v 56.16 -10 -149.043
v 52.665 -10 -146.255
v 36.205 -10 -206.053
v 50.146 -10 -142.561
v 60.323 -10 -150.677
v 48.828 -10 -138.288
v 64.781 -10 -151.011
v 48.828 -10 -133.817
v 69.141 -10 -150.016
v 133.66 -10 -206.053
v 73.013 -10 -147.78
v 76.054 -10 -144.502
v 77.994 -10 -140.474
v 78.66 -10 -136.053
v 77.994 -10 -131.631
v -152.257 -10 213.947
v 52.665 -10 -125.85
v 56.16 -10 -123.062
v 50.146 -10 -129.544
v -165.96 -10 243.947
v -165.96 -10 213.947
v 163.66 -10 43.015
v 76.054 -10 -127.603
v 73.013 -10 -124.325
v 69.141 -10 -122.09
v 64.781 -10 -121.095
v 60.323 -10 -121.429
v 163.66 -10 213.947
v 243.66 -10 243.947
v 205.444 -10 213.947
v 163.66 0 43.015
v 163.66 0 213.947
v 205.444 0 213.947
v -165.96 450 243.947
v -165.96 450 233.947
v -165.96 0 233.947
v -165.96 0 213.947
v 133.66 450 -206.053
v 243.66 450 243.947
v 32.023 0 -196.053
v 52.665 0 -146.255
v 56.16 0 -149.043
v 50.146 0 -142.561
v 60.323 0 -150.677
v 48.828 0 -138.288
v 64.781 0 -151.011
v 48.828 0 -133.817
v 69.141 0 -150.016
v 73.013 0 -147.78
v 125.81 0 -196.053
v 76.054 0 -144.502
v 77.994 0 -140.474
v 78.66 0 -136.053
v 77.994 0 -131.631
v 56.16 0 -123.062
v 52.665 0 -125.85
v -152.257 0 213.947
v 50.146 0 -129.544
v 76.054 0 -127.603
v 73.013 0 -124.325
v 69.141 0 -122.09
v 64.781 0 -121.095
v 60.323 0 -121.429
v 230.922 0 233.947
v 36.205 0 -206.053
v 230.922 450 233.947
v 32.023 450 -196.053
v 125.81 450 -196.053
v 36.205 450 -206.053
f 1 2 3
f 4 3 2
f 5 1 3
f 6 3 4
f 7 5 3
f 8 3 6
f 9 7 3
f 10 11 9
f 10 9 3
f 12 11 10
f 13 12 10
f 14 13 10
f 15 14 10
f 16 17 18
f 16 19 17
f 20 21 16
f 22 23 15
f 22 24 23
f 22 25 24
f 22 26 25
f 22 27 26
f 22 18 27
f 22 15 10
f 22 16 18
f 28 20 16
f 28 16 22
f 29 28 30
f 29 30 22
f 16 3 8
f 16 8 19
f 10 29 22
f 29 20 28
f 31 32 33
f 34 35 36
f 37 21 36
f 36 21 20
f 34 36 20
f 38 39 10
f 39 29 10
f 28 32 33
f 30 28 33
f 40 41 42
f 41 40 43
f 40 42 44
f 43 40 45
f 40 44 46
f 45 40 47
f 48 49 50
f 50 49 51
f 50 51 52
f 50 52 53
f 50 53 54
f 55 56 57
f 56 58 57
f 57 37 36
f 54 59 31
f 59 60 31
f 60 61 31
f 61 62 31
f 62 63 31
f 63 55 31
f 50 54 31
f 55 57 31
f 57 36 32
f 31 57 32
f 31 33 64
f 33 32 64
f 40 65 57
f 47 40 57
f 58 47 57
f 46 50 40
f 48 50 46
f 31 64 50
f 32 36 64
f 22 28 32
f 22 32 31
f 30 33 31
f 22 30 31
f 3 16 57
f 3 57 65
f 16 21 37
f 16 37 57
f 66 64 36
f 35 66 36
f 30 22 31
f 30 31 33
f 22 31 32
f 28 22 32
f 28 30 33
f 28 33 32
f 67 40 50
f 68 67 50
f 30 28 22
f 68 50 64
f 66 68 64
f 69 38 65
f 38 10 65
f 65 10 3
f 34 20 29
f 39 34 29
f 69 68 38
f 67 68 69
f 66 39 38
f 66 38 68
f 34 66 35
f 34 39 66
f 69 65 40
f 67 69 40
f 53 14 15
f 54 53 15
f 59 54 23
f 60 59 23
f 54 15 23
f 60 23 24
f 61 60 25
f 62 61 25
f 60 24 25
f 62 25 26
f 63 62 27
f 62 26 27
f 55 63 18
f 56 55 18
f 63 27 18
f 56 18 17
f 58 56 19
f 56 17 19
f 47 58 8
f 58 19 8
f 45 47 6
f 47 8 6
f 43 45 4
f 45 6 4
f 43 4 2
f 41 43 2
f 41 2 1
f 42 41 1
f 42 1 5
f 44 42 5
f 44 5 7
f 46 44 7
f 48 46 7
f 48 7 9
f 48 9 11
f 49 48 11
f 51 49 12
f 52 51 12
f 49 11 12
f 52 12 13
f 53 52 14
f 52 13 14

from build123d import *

# Parameters (mm, degrees)
F0_W      = 540
F0_H      = 390
F1_DEPTH  = 10
F2_W      = 80
F2_H      = 80
F2_R      = 15
F3_DEPTH  = 10
F4_R      = 15
F5_DEPTH  = 25
F7_DEPTH  = 25
F8_W      = 80
F8_H      = 80
F8_R      = 15
F9_DEPTH  = 25
F11_DEPTH = 10
F13_DEPTH = 450
F15_DEPTH = 10


with BuildPart() as f1:
    # F0 (on Front) → F1 (new body)
    with BuildSketch(Plane.XZ):
        Polygon((-575.5810141563, 243.9473703504), (-465.5810141563, -206.0526296496), (133.660423523, -206.0526296496), (243.660423523, 243.9473703504), (133.660423523, 243.9473703504), (-465.5810141563, 243.9473703504), align=None)
        with Locations((-166.339576477, 18.9473703504)):
            Rectangle(F0_W, F0_H, mode=Mode.SUBTRACT)
        Polygon((-495.5810141563, 43.0153865893), (-537.3643879646, 213.9473703504), (-495.5810141563, 213.9473703504), align=None, mode=Mode.SUBTRACT)
        Polygon((163.660423523, 213.9473703504), (205.4437973313, 213.9473703504), (163.660423523, 43.0153865893), align=None, mode=Mode.SUBTRACT)
    extrude(amount=F1_DEPTH)

    # F2 (on face) → F3 (join)
    with BuildSketch(Plane.XZ.offset(10)):
        with Locations((-396.339576477, 173.9473703504)):
            Rectangle(F2_W, F2_H)
        with Locations((-396.339576477, 173.9473703504)):
            Circle(F2_R, mode=Mode.SUBTRACT)
        with Locations((63.660423523, 173.9473703504)):
            Rectangle(F2_W, F2_H)
        with Locations((63.660423523, 173.9473703504)):
            Circle(F2_R, mode=Mode.SUBTRACT)
        with Locations((63.660423523, -136.0526296496)):
            Rectangle(F2_W, F2_H)
        with Locations((63.660423523, -136.0526296496)):
            Circle(F2_R, mode=Mode.SUBTRACT)
        with Locations((-396.339576477, -136.0526296496)):
            Rectangle(F2_W, F2_H)
        with Locations((-396.339576477, -136.0526296496)):
            Circle(F2_R, mode=Mode.SUBTRACT)
    extrude(amount=-F3_DEPTH)

    # F4 (on face) → F5 (cut)
    with BuildSketch(Plane.XZ.offset(10)):
        Polygon((-669.6358919144, -206.0526296496), (-465.5810141563, -206.0526296496), (-575.5810141563, 243.9473703504), (-669.6358919144, 243.9473703504), align=None)
        Polygon((-465.5810141563, -206.0526296496), (-165.9602953167, -206.0526296496), (-165.9602953167, -176.0526296496), (-356.339576477, -176.0526296496), (-356.339576477, -96.0526296496), (-436.339576477, -96.0526296496), (-436.339576477, 133.9473703504), (-356.339576477, 133.9473703504), (-356.339576477, 213.9473703504), (-165.9602953167, 213.9473703504), (-165.9602953167, 243.9473703504), (-575.5810141563, 243.9473703504), align=None)
        with Locations((-396.339576477, -136.0526296496)):
            Circle(F4_R, mode=Mode.SUBTRACT)
        Polygon((-495.5810141563, 213.9473703504), (-495.5810141563, 43.0153865893), (-537.3643879646, 213.9473703504), align=None, mode=Mode.SUBTRACT)
        with Locations((-396.339576477, 173.9473703504)):
            Circle(F4_R, mode=Mode.SUBTRACT)
        Polygon((-356.339576477, -176.0526296496), (-165.9602953167, -176.0526296496), (-165.9602953167, 213.9473703504), (-356.339576477, 213.9473703504), (-356.339576477, 133.9473703504), (-436.339576477, 133.9473703504), (-436.339576477, -96.0526296496), (-356.339576477, -96.0526296496), align=None)
    extrude(amount=-F5_DEPTH, mode=Mode.SUBTRACT)

    # F6 (on face) → F7 (cut)
    with BuildSketch(Plane.XZ.offset(10)):
        Polygon((36.2046845257, -206.0526296496), (23.660423523, -176.0526296496), (-165.9602953167, -176.0526296496), (-165.9602953167, -206.0526296496), align=None)
    extrude(amount=-F7_DEPTH, mode=Mode.SUBTRACT)

    # F8 (on face) → F9 (cut)
    with BuildSketch(Plane.XZ.offset(10)):
        with Locations((63.660423523, 173.9473703504)):
            Rectangle(F8_W, F8_H)
        with Locations((63.660423523, 173.9473703504)):
            Circle(F8_R, mode=Mode.SUBTRACT)
    extrude(amount=-F9_DEPTH, mode=Mode.SUBTRACT)

    # F12 (on face) → F13 (join)
    with BuildSketch(Plane(origin=(0, 0, 0), x_dir=(-1, 0, 0), z_dir=(0, 1, 0))):
        Polygon((165.9602953167, 243.9473703504), (-243.660423523, 243.9473703504), (-133.660423523, -206.0526296496), (-36.2046845257, -206.0526296496), (-32.0232641915, -196.0526296496), (-36.2046845257, -196.0526296496), (-125.8104370147, -196.0526296496), (-230.9215481258, 233.9473703504), (165.9602953167, 233.9473703504), align=None)
    extrude(amount=F13_DEPTH)

    # F14 (on face) → F15 (join)
    with BuildSketch(Plane.XZ.offset(10)):
        Polygon((-152.2566229105, 213.9473703504), (36.2046845257, -206.0526296496), (23.660423523, -176.0526296496), (23.660423523, -96.0526296496), (103.660423523, -96.0526296496), (103.660423523, 213.9473703504), align=None)
    extrude(amount=-F15_DEPTH)


with BuildPart() as f11:
    # F10 (on face) → F11 (new body)
    with BuildSketch(Plane.XZ.offset(10)):
        Polygon((205.4437973313, 213.9473703504), (163.660423523, 213.9473703504), (163.660423523, 43.0153865893), align=None)
    extrude(amount=-F11_DEPTH)


solid = Compound([f1.part, f11.part])
